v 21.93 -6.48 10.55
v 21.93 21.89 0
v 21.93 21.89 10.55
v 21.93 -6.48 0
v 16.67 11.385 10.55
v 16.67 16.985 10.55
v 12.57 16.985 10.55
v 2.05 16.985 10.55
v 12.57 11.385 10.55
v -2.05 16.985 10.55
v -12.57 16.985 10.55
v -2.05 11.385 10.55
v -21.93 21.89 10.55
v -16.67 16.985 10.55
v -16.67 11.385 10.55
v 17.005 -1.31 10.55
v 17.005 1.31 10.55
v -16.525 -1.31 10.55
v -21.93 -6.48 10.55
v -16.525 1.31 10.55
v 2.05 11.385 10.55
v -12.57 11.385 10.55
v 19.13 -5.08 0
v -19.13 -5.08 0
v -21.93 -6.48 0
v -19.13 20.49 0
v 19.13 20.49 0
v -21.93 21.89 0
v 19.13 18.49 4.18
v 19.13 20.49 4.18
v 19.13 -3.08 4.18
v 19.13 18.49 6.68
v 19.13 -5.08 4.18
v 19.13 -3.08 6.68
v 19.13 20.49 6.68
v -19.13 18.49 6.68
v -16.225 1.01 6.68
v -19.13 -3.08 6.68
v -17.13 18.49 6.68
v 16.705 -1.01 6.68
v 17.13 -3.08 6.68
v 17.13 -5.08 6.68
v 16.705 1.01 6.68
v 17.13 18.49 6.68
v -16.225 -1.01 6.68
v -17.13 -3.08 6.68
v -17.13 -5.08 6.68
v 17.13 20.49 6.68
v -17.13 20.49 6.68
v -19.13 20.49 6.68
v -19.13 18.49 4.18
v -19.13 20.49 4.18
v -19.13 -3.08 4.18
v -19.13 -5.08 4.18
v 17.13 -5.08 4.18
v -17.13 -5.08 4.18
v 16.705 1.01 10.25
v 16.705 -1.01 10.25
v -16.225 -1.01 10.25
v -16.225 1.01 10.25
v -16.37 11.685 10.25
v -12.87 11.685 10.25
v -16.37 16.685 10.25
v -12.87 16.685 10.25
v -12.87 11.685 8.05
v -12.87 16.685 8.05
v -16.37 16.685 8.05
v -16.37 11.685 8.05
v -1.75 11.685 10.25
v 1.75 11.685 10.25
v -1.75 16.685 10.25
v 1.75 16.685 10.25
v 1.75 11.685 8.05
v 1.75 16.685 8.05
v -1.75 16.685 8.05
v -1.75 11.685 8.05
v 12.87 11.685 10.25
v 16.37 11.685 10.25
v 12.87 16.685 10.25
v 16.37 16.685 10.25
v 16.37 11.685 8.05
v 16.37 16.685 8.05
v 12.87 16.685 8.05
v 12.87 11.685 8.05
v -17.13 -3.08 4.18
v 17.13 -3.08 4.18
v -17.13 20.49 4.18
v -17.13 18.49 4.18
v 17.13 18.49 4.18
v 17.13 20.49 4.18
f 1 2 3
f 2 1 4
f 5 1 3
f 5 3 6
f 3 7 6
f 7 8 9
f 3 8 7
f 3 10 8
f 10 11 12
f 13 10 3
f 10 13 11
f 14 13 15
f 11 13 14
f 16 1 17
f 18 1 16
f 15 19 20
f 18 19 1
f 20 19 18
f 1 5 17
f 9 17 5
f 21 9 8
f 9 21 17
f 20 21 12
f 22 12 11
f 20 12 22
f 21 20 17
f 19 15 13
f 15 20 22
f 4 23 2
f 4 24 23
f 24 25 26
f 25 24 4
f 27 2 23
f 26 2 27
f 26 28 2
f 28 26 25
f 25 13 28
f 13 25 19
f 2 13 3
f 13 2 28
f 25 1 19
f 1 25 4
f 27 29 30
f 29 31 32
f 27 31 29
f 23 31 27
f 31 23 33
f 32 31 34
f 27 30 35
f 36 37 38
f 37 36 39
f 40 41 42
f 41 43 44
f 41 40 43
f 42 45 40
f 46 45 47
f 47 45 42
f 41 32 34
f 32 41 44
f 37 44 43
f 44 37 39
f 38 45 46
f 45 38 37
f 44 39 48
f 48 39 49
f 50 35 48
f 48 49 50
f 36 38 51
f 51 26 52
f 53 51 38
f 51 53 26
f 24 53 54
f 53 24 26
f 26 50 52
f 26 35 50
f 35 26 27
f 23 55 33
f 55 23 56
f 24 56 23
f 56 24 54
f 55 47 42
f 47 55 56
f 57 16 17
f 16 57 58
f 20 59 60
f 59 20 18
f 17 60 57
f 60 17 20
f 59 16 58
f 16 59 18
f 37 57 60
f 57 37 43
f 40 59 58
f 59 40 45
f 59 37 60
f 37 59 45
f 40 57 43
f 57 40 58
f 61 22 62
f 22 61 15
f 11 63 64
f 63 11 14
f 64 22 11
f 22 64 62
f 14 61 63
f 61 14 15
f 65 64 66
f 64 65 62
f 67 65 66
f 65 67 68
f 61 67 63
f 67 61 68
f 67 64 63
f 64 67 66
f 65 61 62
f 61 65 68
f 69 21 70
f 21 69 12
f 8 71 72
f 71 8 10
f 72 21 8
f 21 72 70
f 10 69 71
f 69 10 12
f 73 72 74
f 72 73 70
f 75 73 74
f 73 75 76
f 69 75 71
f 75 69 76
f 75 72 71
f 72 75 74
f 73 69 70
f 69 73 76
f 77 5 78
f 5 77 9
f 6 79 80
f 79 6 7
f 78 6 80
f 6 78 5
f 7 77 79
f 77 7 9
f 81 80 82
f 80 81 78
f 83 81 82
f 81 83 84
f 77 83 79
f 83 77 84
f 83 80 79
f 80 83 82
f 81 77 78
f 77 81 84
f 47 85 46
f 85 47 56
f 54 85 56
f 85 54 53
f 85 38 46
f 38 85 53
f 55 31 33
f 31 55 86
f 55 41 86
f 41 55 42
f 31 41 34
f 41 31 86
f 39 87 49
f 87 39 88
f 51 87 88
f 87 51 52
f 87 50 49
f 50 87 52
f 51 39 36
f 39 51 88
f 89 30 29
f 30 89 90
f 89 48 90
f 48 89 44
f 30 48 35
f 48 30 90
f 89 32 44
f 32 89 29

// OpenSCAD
// file: base_modules.scad
//dimensions = [number of edges, distance from corner to center, height]
module n_edged_block(dimensions) {
    n = dimensions[0];
    r = dimensions[1];
    height = dimensions[2];
    angles = [ for (i = [0:n-1]) i*(360/n) ];
    coords = [ for (th=angles) [r*cos(th), r*sin(th)] ];
    linear_extrude(height, convexity = 10)
        polygon(coords);
}

//dimensions = [lower diameter, upper diameter, height]
module solid_cylinder(dimensions) {
    translate([0, 0, dimensions[2]/2])
        cylinder(dimensions[2], d1= dimensions[0], d2 = dimensions[1], center = true, $fn = 100);
}

//dimensions = [diameter of cylinder, elongation from center, height]
module elongated_cylinder(dimensions) {
    radius = dimensions[0]/2;
    for (i = [-1 : 2 : 1]) translate([i * dimensions[1]/2, 0, 0])
        cylinder(dimensions[2], radius, radius, $fn=100);
    #solid_block([dimensions[1], dimensions[0], dimensions[2]]);
}

//dimensions = [width(x), length(y), height(z)]
module solid_block(dimensions) {
    translate([0, 0, dimensions[2]/2])
        cube(dimensions, true);
}

//dimensions = [width(x), length(y), height(z)]
//chamferWidth = width of cut on bottom corners
module solid_block_chamferred(dimensions, chamferWidth = 0) {
    difference() {
        solid_block(dimensions);
        for (i = [0 : 1]) {
            translate([(i%2)*(dimensions[0]-chamferWidth)/2, (1-i%2)*(dimensions[1]-chamferWidth)/2, chamferWidth/2])
            rotate([-135*(1-i%2), 135*(i%2), 0])
                solid_block(
                            [(1-i%2)*dimensions[0] + (i%2)*chamferWidth*2, 
                             (i%2)*dimensions[1] + (1-i%2)*chamferWidth*2, 
                             chamferWidth]);
            translate([-(i%2)*(dimensions[0]-chamferWidth)/2, -(1-i%2)*(dimensions[1]-chamferWidth)/2, chamferWidth/2])
            rotate([135*(1-i%2), -135*(i%2), 0])
                solid_block(
                            [(1-i%2)*dimensions[0] + (i%2)*chamferWidth*2, 
                             (i%2)*dimensions[1] + (1-i%2)*chamferWidth*2, 
                             chamferWidth]);
        }
    }
}

//mainly used for subtration
//dimensions = [width(x), length(y)]
//chamferWidth = height and extra width that is meant to be subtracted
module inner_chamferring(dimensions, chamferWidth = 0) {
    dimensions = [dimensions[0]+chamferWidth*2, dimensions[1]+chamferWidth*2, chamferWidth];
    difference() {
        solid_block(dimensions);
        for (i = [0 : 1]) {
            translate([(i%2)*(dimensions[0]-chamferWidth)/2, (1-i%2)*(dimensions[1]-chamferWidth)/2, chamferWidth/2])
            rotate([-45*(1-i%2), 45*(i%2), 0])
                solid_block(
                            [(1-i%2)*dimensions[0] + (i%2)*chamferWidth*2, 
                             (i%2)*dimensions[1] + (1-i%2)*chamferWidth*2, 
                             chamferWidth]);
            translate([-(i%2)*(dimensions[0]-chamferWidth)/2, -(1-i%2)*(dimensions[1]-chamferWidth)/2, chamferWidth/2])
            rotate([45*(1-i%2), -45*(i%2), 0])
                solid_block(
                            [(1-i%2)*dimensions[0] + (i%2)*chamferWidth*2, 
                             (i%2)*dimensions[1] + (1-i%2)*chamferWidth*2, 
                             chamferWidth]);
        }
    }
}

//for bigger modules, copy and paste and replace __format__ with the name of the module you are creating
module _format_(shift = [0, 0, 0], rotation = [0, 0, 0]) {
    translate(shift) { rotate(rotation) {
    
    
    
    
    
    }}
}
// main file
use <base_modules.scad>

letterDisplayWH = 25.08;
letterDisplayT = 1.72;
letterHoldPanelH = 27.55 - letterDisplayWH;
letterHoldPanelW = 12.4;

circBrdW = 37.96;
circBrdL = 25.27;
circBrdT = 1.68;
circBrdTopH = 2.5;
circBrdBotH = 2.5;
circBrdH = circBrdT + circBrdTopH + circBrdBotH;
circBrdErrorCompensation = 0.24;

ledOffset = 3.81;
ledOffsetFrmEdge = 5.08;

wallT = 1.4;
baseTopT = wallT + letterHoldPanelH;
baseW = circBrdW + 0.3 + wallT*4;
baseL = circBrdL + 0.3 + wallT*2;
baseH = circBrdH + baseTopT;

slitL = letterHoldPanelW + 0.2;
longSlitL = 32.73 + 0.2;
slitT = letterDisplayT + 0.3;

lockingHoleW = 3.5;
lockingHoleL = 5;
lockingHoleH = 2.5;
lockingShaftW = lockingHoleW - 0.3;
lockingShaftL = lockingHoleL - 0.3;
lockingShaftH = lockingHoleH - 0.15;

*letter_display([0, 0, circBrdH + wallT], [0, 0, 45]);
*circuit_board();
BaseV2();
*slit();



module BaseV1(shift = [0, 0, 0], rotation = [0, 0, 0]) {
    innerW = circBrdW + 0.3;
    innerL = circBrdL + 0.3;
    translate(shift) { rotate(rotation) {
    
    
    difference() {
        translate([0, (innerL)/2 - ledOffsetFrmEdge, 0]) difference() {
            solid_block([baseW, baseL, baseH]);
            solid_block([innerW, innerL, circBrdH]);
        }
        for (i = [-4 : 4])
            slitV1([ledOffset*i + circBrdErrorCompensation, 0, 0], [0, 0, 45]);
        translate([0, baseL/2, baseH]) for (i = [-1 : 1])
            locking_hole([baseW/3*i, 0, 0]);
    }
    for(i = [-1 : 2 : 1]) for (j = [-1 : 2 : 1]) translate([j*(innerW-2)/2, (innerL)/2 - ledOffsetFrmEdge + i*(innerL-2)/2, circBrdH - circBrdTopH])
        solid_block([2, 2, circBrdTopH]);
    
    
    }}
}

module BaseV2(shift = [0, 0, 0], rotation = [0, 0, 0]) {
    innerW = circBrdW + 0.3;
    innerL = circBrdL + 0.3;
    translate(shift) { rotate(rotation) {
    
    
    difference() {
        translate([0, (innerL)/2 - ledOffsetFrmEdge, 0]) difference() {
            solid_block([baseW, baseL, baseH]);
            solid_block([innerW, innerL, circBrdH]);
        }
        /*for (i = [-4 : 4])
            slit([ledOffset*i + circBrdErrorCompensation, 0, 0], [0, 0, 45]);*/
        slitV2([circBrdErrorCompensation, 0, 0], [0, 0, 90]);
        translate([0, baseL/2, baseH]) for (i = [-1 : 1])
            locking_hole([baseW/3*i, 0, 0]);
    }
    for(i = [-1 : 2 : 1]) for (j = [-1 : 2 : 1]) translate([j*(innerW-2)/2, (innerL)/2 - ledOffsetFrmEdge + i*(innerL-2)/2, circBrdH - circBrdTopH])
        solid_block([2, 2, circBrdTopH]);
    
    
    }}
}

module circuit_board(shift = [0, 0, 0], rotation = [0, 0, 0]) {
    translate(shift) { rotate(rotation) {
    
    
    translate([0, (circBrdL)/2 - ledOffsetFrmEdge, 0])
        solid_block([circBrdW, circBrdL, circBrdH]);
    
    
    }}
}

module slitV1(shift = [0, 0, 0], rotation = [0, 0, 0]) {
    render() translate(shift) { rotate(rotation) {
    
    
    difference() {
        union() {
            solid_block([slitT, slitL, baseH]);
            translate([0, 0, baseH]) rotate([180, 0, 0])
                inner_chamferring([slitT, slitL, 1], 0.3);
        }
        for (i = [-1 : 2 : 1]) translate([0, (slitL-slitL/4)/2*i, 0])
            solid_block([slitT, slitL/4, circBrdH + wallT - 0.2]);
    }
    
    
    }}
}

module slitV2(shift = [0, 0, 0], rotation = [0, 0, 0]) {
    render() translate(shift) { rotate(rotation) {
    
    
    difference() {
        union() {
            solid_block([slitT, longSlitL, baseH]);
            translate([0, 0, baseH]) rotate([180, 0, 0])
                inner_chamferring([slitT, longSlitL, 1], 0.3);
        }
        *for (i = [-1 : 2 : 1]) translate([0, (slitL-slitL/4)/2*i, 0])
            solid_block([slitT, slitL/4, circBrdH + wallT - 0.2]);
    }
    
    
    }}
}

module letter_display(shift = [0, 0, 0], rotation = [0, 0, 0]) {
    translate(shift) { rotate(rotation) {
    
    
    translate([0, 0, letterHoldPanelH])
        solid_block([letterDisplayT, letterDisplayWH, letterDisplayWH]);
    solid_block([letterDisplayT, letterHoldPanelW, letterHoldPanelH]);
    
    
    }}
}

module locking_hole(shift = [0, 0, 0], rotation = [0, 0, 0]) {
    render() translate(shift) { rotate(rotation) {
    
    
    translate([0, 0, -lockingHoleH])
        solid_block([lockingHoleW, lockingHoleL, lockingHoleH]);
    rotate([180, 0, 0])
        inner_chamferring([lockingHoleW, lockingHoleL, 1], 0.3);
    
    
    }}
}

module _format_(shift = [0, 0, 0], rotation = [0, 0, 0]) {
    translate(shift) { rotate(rotation) {
    
    
    
    
    
    }}
}
